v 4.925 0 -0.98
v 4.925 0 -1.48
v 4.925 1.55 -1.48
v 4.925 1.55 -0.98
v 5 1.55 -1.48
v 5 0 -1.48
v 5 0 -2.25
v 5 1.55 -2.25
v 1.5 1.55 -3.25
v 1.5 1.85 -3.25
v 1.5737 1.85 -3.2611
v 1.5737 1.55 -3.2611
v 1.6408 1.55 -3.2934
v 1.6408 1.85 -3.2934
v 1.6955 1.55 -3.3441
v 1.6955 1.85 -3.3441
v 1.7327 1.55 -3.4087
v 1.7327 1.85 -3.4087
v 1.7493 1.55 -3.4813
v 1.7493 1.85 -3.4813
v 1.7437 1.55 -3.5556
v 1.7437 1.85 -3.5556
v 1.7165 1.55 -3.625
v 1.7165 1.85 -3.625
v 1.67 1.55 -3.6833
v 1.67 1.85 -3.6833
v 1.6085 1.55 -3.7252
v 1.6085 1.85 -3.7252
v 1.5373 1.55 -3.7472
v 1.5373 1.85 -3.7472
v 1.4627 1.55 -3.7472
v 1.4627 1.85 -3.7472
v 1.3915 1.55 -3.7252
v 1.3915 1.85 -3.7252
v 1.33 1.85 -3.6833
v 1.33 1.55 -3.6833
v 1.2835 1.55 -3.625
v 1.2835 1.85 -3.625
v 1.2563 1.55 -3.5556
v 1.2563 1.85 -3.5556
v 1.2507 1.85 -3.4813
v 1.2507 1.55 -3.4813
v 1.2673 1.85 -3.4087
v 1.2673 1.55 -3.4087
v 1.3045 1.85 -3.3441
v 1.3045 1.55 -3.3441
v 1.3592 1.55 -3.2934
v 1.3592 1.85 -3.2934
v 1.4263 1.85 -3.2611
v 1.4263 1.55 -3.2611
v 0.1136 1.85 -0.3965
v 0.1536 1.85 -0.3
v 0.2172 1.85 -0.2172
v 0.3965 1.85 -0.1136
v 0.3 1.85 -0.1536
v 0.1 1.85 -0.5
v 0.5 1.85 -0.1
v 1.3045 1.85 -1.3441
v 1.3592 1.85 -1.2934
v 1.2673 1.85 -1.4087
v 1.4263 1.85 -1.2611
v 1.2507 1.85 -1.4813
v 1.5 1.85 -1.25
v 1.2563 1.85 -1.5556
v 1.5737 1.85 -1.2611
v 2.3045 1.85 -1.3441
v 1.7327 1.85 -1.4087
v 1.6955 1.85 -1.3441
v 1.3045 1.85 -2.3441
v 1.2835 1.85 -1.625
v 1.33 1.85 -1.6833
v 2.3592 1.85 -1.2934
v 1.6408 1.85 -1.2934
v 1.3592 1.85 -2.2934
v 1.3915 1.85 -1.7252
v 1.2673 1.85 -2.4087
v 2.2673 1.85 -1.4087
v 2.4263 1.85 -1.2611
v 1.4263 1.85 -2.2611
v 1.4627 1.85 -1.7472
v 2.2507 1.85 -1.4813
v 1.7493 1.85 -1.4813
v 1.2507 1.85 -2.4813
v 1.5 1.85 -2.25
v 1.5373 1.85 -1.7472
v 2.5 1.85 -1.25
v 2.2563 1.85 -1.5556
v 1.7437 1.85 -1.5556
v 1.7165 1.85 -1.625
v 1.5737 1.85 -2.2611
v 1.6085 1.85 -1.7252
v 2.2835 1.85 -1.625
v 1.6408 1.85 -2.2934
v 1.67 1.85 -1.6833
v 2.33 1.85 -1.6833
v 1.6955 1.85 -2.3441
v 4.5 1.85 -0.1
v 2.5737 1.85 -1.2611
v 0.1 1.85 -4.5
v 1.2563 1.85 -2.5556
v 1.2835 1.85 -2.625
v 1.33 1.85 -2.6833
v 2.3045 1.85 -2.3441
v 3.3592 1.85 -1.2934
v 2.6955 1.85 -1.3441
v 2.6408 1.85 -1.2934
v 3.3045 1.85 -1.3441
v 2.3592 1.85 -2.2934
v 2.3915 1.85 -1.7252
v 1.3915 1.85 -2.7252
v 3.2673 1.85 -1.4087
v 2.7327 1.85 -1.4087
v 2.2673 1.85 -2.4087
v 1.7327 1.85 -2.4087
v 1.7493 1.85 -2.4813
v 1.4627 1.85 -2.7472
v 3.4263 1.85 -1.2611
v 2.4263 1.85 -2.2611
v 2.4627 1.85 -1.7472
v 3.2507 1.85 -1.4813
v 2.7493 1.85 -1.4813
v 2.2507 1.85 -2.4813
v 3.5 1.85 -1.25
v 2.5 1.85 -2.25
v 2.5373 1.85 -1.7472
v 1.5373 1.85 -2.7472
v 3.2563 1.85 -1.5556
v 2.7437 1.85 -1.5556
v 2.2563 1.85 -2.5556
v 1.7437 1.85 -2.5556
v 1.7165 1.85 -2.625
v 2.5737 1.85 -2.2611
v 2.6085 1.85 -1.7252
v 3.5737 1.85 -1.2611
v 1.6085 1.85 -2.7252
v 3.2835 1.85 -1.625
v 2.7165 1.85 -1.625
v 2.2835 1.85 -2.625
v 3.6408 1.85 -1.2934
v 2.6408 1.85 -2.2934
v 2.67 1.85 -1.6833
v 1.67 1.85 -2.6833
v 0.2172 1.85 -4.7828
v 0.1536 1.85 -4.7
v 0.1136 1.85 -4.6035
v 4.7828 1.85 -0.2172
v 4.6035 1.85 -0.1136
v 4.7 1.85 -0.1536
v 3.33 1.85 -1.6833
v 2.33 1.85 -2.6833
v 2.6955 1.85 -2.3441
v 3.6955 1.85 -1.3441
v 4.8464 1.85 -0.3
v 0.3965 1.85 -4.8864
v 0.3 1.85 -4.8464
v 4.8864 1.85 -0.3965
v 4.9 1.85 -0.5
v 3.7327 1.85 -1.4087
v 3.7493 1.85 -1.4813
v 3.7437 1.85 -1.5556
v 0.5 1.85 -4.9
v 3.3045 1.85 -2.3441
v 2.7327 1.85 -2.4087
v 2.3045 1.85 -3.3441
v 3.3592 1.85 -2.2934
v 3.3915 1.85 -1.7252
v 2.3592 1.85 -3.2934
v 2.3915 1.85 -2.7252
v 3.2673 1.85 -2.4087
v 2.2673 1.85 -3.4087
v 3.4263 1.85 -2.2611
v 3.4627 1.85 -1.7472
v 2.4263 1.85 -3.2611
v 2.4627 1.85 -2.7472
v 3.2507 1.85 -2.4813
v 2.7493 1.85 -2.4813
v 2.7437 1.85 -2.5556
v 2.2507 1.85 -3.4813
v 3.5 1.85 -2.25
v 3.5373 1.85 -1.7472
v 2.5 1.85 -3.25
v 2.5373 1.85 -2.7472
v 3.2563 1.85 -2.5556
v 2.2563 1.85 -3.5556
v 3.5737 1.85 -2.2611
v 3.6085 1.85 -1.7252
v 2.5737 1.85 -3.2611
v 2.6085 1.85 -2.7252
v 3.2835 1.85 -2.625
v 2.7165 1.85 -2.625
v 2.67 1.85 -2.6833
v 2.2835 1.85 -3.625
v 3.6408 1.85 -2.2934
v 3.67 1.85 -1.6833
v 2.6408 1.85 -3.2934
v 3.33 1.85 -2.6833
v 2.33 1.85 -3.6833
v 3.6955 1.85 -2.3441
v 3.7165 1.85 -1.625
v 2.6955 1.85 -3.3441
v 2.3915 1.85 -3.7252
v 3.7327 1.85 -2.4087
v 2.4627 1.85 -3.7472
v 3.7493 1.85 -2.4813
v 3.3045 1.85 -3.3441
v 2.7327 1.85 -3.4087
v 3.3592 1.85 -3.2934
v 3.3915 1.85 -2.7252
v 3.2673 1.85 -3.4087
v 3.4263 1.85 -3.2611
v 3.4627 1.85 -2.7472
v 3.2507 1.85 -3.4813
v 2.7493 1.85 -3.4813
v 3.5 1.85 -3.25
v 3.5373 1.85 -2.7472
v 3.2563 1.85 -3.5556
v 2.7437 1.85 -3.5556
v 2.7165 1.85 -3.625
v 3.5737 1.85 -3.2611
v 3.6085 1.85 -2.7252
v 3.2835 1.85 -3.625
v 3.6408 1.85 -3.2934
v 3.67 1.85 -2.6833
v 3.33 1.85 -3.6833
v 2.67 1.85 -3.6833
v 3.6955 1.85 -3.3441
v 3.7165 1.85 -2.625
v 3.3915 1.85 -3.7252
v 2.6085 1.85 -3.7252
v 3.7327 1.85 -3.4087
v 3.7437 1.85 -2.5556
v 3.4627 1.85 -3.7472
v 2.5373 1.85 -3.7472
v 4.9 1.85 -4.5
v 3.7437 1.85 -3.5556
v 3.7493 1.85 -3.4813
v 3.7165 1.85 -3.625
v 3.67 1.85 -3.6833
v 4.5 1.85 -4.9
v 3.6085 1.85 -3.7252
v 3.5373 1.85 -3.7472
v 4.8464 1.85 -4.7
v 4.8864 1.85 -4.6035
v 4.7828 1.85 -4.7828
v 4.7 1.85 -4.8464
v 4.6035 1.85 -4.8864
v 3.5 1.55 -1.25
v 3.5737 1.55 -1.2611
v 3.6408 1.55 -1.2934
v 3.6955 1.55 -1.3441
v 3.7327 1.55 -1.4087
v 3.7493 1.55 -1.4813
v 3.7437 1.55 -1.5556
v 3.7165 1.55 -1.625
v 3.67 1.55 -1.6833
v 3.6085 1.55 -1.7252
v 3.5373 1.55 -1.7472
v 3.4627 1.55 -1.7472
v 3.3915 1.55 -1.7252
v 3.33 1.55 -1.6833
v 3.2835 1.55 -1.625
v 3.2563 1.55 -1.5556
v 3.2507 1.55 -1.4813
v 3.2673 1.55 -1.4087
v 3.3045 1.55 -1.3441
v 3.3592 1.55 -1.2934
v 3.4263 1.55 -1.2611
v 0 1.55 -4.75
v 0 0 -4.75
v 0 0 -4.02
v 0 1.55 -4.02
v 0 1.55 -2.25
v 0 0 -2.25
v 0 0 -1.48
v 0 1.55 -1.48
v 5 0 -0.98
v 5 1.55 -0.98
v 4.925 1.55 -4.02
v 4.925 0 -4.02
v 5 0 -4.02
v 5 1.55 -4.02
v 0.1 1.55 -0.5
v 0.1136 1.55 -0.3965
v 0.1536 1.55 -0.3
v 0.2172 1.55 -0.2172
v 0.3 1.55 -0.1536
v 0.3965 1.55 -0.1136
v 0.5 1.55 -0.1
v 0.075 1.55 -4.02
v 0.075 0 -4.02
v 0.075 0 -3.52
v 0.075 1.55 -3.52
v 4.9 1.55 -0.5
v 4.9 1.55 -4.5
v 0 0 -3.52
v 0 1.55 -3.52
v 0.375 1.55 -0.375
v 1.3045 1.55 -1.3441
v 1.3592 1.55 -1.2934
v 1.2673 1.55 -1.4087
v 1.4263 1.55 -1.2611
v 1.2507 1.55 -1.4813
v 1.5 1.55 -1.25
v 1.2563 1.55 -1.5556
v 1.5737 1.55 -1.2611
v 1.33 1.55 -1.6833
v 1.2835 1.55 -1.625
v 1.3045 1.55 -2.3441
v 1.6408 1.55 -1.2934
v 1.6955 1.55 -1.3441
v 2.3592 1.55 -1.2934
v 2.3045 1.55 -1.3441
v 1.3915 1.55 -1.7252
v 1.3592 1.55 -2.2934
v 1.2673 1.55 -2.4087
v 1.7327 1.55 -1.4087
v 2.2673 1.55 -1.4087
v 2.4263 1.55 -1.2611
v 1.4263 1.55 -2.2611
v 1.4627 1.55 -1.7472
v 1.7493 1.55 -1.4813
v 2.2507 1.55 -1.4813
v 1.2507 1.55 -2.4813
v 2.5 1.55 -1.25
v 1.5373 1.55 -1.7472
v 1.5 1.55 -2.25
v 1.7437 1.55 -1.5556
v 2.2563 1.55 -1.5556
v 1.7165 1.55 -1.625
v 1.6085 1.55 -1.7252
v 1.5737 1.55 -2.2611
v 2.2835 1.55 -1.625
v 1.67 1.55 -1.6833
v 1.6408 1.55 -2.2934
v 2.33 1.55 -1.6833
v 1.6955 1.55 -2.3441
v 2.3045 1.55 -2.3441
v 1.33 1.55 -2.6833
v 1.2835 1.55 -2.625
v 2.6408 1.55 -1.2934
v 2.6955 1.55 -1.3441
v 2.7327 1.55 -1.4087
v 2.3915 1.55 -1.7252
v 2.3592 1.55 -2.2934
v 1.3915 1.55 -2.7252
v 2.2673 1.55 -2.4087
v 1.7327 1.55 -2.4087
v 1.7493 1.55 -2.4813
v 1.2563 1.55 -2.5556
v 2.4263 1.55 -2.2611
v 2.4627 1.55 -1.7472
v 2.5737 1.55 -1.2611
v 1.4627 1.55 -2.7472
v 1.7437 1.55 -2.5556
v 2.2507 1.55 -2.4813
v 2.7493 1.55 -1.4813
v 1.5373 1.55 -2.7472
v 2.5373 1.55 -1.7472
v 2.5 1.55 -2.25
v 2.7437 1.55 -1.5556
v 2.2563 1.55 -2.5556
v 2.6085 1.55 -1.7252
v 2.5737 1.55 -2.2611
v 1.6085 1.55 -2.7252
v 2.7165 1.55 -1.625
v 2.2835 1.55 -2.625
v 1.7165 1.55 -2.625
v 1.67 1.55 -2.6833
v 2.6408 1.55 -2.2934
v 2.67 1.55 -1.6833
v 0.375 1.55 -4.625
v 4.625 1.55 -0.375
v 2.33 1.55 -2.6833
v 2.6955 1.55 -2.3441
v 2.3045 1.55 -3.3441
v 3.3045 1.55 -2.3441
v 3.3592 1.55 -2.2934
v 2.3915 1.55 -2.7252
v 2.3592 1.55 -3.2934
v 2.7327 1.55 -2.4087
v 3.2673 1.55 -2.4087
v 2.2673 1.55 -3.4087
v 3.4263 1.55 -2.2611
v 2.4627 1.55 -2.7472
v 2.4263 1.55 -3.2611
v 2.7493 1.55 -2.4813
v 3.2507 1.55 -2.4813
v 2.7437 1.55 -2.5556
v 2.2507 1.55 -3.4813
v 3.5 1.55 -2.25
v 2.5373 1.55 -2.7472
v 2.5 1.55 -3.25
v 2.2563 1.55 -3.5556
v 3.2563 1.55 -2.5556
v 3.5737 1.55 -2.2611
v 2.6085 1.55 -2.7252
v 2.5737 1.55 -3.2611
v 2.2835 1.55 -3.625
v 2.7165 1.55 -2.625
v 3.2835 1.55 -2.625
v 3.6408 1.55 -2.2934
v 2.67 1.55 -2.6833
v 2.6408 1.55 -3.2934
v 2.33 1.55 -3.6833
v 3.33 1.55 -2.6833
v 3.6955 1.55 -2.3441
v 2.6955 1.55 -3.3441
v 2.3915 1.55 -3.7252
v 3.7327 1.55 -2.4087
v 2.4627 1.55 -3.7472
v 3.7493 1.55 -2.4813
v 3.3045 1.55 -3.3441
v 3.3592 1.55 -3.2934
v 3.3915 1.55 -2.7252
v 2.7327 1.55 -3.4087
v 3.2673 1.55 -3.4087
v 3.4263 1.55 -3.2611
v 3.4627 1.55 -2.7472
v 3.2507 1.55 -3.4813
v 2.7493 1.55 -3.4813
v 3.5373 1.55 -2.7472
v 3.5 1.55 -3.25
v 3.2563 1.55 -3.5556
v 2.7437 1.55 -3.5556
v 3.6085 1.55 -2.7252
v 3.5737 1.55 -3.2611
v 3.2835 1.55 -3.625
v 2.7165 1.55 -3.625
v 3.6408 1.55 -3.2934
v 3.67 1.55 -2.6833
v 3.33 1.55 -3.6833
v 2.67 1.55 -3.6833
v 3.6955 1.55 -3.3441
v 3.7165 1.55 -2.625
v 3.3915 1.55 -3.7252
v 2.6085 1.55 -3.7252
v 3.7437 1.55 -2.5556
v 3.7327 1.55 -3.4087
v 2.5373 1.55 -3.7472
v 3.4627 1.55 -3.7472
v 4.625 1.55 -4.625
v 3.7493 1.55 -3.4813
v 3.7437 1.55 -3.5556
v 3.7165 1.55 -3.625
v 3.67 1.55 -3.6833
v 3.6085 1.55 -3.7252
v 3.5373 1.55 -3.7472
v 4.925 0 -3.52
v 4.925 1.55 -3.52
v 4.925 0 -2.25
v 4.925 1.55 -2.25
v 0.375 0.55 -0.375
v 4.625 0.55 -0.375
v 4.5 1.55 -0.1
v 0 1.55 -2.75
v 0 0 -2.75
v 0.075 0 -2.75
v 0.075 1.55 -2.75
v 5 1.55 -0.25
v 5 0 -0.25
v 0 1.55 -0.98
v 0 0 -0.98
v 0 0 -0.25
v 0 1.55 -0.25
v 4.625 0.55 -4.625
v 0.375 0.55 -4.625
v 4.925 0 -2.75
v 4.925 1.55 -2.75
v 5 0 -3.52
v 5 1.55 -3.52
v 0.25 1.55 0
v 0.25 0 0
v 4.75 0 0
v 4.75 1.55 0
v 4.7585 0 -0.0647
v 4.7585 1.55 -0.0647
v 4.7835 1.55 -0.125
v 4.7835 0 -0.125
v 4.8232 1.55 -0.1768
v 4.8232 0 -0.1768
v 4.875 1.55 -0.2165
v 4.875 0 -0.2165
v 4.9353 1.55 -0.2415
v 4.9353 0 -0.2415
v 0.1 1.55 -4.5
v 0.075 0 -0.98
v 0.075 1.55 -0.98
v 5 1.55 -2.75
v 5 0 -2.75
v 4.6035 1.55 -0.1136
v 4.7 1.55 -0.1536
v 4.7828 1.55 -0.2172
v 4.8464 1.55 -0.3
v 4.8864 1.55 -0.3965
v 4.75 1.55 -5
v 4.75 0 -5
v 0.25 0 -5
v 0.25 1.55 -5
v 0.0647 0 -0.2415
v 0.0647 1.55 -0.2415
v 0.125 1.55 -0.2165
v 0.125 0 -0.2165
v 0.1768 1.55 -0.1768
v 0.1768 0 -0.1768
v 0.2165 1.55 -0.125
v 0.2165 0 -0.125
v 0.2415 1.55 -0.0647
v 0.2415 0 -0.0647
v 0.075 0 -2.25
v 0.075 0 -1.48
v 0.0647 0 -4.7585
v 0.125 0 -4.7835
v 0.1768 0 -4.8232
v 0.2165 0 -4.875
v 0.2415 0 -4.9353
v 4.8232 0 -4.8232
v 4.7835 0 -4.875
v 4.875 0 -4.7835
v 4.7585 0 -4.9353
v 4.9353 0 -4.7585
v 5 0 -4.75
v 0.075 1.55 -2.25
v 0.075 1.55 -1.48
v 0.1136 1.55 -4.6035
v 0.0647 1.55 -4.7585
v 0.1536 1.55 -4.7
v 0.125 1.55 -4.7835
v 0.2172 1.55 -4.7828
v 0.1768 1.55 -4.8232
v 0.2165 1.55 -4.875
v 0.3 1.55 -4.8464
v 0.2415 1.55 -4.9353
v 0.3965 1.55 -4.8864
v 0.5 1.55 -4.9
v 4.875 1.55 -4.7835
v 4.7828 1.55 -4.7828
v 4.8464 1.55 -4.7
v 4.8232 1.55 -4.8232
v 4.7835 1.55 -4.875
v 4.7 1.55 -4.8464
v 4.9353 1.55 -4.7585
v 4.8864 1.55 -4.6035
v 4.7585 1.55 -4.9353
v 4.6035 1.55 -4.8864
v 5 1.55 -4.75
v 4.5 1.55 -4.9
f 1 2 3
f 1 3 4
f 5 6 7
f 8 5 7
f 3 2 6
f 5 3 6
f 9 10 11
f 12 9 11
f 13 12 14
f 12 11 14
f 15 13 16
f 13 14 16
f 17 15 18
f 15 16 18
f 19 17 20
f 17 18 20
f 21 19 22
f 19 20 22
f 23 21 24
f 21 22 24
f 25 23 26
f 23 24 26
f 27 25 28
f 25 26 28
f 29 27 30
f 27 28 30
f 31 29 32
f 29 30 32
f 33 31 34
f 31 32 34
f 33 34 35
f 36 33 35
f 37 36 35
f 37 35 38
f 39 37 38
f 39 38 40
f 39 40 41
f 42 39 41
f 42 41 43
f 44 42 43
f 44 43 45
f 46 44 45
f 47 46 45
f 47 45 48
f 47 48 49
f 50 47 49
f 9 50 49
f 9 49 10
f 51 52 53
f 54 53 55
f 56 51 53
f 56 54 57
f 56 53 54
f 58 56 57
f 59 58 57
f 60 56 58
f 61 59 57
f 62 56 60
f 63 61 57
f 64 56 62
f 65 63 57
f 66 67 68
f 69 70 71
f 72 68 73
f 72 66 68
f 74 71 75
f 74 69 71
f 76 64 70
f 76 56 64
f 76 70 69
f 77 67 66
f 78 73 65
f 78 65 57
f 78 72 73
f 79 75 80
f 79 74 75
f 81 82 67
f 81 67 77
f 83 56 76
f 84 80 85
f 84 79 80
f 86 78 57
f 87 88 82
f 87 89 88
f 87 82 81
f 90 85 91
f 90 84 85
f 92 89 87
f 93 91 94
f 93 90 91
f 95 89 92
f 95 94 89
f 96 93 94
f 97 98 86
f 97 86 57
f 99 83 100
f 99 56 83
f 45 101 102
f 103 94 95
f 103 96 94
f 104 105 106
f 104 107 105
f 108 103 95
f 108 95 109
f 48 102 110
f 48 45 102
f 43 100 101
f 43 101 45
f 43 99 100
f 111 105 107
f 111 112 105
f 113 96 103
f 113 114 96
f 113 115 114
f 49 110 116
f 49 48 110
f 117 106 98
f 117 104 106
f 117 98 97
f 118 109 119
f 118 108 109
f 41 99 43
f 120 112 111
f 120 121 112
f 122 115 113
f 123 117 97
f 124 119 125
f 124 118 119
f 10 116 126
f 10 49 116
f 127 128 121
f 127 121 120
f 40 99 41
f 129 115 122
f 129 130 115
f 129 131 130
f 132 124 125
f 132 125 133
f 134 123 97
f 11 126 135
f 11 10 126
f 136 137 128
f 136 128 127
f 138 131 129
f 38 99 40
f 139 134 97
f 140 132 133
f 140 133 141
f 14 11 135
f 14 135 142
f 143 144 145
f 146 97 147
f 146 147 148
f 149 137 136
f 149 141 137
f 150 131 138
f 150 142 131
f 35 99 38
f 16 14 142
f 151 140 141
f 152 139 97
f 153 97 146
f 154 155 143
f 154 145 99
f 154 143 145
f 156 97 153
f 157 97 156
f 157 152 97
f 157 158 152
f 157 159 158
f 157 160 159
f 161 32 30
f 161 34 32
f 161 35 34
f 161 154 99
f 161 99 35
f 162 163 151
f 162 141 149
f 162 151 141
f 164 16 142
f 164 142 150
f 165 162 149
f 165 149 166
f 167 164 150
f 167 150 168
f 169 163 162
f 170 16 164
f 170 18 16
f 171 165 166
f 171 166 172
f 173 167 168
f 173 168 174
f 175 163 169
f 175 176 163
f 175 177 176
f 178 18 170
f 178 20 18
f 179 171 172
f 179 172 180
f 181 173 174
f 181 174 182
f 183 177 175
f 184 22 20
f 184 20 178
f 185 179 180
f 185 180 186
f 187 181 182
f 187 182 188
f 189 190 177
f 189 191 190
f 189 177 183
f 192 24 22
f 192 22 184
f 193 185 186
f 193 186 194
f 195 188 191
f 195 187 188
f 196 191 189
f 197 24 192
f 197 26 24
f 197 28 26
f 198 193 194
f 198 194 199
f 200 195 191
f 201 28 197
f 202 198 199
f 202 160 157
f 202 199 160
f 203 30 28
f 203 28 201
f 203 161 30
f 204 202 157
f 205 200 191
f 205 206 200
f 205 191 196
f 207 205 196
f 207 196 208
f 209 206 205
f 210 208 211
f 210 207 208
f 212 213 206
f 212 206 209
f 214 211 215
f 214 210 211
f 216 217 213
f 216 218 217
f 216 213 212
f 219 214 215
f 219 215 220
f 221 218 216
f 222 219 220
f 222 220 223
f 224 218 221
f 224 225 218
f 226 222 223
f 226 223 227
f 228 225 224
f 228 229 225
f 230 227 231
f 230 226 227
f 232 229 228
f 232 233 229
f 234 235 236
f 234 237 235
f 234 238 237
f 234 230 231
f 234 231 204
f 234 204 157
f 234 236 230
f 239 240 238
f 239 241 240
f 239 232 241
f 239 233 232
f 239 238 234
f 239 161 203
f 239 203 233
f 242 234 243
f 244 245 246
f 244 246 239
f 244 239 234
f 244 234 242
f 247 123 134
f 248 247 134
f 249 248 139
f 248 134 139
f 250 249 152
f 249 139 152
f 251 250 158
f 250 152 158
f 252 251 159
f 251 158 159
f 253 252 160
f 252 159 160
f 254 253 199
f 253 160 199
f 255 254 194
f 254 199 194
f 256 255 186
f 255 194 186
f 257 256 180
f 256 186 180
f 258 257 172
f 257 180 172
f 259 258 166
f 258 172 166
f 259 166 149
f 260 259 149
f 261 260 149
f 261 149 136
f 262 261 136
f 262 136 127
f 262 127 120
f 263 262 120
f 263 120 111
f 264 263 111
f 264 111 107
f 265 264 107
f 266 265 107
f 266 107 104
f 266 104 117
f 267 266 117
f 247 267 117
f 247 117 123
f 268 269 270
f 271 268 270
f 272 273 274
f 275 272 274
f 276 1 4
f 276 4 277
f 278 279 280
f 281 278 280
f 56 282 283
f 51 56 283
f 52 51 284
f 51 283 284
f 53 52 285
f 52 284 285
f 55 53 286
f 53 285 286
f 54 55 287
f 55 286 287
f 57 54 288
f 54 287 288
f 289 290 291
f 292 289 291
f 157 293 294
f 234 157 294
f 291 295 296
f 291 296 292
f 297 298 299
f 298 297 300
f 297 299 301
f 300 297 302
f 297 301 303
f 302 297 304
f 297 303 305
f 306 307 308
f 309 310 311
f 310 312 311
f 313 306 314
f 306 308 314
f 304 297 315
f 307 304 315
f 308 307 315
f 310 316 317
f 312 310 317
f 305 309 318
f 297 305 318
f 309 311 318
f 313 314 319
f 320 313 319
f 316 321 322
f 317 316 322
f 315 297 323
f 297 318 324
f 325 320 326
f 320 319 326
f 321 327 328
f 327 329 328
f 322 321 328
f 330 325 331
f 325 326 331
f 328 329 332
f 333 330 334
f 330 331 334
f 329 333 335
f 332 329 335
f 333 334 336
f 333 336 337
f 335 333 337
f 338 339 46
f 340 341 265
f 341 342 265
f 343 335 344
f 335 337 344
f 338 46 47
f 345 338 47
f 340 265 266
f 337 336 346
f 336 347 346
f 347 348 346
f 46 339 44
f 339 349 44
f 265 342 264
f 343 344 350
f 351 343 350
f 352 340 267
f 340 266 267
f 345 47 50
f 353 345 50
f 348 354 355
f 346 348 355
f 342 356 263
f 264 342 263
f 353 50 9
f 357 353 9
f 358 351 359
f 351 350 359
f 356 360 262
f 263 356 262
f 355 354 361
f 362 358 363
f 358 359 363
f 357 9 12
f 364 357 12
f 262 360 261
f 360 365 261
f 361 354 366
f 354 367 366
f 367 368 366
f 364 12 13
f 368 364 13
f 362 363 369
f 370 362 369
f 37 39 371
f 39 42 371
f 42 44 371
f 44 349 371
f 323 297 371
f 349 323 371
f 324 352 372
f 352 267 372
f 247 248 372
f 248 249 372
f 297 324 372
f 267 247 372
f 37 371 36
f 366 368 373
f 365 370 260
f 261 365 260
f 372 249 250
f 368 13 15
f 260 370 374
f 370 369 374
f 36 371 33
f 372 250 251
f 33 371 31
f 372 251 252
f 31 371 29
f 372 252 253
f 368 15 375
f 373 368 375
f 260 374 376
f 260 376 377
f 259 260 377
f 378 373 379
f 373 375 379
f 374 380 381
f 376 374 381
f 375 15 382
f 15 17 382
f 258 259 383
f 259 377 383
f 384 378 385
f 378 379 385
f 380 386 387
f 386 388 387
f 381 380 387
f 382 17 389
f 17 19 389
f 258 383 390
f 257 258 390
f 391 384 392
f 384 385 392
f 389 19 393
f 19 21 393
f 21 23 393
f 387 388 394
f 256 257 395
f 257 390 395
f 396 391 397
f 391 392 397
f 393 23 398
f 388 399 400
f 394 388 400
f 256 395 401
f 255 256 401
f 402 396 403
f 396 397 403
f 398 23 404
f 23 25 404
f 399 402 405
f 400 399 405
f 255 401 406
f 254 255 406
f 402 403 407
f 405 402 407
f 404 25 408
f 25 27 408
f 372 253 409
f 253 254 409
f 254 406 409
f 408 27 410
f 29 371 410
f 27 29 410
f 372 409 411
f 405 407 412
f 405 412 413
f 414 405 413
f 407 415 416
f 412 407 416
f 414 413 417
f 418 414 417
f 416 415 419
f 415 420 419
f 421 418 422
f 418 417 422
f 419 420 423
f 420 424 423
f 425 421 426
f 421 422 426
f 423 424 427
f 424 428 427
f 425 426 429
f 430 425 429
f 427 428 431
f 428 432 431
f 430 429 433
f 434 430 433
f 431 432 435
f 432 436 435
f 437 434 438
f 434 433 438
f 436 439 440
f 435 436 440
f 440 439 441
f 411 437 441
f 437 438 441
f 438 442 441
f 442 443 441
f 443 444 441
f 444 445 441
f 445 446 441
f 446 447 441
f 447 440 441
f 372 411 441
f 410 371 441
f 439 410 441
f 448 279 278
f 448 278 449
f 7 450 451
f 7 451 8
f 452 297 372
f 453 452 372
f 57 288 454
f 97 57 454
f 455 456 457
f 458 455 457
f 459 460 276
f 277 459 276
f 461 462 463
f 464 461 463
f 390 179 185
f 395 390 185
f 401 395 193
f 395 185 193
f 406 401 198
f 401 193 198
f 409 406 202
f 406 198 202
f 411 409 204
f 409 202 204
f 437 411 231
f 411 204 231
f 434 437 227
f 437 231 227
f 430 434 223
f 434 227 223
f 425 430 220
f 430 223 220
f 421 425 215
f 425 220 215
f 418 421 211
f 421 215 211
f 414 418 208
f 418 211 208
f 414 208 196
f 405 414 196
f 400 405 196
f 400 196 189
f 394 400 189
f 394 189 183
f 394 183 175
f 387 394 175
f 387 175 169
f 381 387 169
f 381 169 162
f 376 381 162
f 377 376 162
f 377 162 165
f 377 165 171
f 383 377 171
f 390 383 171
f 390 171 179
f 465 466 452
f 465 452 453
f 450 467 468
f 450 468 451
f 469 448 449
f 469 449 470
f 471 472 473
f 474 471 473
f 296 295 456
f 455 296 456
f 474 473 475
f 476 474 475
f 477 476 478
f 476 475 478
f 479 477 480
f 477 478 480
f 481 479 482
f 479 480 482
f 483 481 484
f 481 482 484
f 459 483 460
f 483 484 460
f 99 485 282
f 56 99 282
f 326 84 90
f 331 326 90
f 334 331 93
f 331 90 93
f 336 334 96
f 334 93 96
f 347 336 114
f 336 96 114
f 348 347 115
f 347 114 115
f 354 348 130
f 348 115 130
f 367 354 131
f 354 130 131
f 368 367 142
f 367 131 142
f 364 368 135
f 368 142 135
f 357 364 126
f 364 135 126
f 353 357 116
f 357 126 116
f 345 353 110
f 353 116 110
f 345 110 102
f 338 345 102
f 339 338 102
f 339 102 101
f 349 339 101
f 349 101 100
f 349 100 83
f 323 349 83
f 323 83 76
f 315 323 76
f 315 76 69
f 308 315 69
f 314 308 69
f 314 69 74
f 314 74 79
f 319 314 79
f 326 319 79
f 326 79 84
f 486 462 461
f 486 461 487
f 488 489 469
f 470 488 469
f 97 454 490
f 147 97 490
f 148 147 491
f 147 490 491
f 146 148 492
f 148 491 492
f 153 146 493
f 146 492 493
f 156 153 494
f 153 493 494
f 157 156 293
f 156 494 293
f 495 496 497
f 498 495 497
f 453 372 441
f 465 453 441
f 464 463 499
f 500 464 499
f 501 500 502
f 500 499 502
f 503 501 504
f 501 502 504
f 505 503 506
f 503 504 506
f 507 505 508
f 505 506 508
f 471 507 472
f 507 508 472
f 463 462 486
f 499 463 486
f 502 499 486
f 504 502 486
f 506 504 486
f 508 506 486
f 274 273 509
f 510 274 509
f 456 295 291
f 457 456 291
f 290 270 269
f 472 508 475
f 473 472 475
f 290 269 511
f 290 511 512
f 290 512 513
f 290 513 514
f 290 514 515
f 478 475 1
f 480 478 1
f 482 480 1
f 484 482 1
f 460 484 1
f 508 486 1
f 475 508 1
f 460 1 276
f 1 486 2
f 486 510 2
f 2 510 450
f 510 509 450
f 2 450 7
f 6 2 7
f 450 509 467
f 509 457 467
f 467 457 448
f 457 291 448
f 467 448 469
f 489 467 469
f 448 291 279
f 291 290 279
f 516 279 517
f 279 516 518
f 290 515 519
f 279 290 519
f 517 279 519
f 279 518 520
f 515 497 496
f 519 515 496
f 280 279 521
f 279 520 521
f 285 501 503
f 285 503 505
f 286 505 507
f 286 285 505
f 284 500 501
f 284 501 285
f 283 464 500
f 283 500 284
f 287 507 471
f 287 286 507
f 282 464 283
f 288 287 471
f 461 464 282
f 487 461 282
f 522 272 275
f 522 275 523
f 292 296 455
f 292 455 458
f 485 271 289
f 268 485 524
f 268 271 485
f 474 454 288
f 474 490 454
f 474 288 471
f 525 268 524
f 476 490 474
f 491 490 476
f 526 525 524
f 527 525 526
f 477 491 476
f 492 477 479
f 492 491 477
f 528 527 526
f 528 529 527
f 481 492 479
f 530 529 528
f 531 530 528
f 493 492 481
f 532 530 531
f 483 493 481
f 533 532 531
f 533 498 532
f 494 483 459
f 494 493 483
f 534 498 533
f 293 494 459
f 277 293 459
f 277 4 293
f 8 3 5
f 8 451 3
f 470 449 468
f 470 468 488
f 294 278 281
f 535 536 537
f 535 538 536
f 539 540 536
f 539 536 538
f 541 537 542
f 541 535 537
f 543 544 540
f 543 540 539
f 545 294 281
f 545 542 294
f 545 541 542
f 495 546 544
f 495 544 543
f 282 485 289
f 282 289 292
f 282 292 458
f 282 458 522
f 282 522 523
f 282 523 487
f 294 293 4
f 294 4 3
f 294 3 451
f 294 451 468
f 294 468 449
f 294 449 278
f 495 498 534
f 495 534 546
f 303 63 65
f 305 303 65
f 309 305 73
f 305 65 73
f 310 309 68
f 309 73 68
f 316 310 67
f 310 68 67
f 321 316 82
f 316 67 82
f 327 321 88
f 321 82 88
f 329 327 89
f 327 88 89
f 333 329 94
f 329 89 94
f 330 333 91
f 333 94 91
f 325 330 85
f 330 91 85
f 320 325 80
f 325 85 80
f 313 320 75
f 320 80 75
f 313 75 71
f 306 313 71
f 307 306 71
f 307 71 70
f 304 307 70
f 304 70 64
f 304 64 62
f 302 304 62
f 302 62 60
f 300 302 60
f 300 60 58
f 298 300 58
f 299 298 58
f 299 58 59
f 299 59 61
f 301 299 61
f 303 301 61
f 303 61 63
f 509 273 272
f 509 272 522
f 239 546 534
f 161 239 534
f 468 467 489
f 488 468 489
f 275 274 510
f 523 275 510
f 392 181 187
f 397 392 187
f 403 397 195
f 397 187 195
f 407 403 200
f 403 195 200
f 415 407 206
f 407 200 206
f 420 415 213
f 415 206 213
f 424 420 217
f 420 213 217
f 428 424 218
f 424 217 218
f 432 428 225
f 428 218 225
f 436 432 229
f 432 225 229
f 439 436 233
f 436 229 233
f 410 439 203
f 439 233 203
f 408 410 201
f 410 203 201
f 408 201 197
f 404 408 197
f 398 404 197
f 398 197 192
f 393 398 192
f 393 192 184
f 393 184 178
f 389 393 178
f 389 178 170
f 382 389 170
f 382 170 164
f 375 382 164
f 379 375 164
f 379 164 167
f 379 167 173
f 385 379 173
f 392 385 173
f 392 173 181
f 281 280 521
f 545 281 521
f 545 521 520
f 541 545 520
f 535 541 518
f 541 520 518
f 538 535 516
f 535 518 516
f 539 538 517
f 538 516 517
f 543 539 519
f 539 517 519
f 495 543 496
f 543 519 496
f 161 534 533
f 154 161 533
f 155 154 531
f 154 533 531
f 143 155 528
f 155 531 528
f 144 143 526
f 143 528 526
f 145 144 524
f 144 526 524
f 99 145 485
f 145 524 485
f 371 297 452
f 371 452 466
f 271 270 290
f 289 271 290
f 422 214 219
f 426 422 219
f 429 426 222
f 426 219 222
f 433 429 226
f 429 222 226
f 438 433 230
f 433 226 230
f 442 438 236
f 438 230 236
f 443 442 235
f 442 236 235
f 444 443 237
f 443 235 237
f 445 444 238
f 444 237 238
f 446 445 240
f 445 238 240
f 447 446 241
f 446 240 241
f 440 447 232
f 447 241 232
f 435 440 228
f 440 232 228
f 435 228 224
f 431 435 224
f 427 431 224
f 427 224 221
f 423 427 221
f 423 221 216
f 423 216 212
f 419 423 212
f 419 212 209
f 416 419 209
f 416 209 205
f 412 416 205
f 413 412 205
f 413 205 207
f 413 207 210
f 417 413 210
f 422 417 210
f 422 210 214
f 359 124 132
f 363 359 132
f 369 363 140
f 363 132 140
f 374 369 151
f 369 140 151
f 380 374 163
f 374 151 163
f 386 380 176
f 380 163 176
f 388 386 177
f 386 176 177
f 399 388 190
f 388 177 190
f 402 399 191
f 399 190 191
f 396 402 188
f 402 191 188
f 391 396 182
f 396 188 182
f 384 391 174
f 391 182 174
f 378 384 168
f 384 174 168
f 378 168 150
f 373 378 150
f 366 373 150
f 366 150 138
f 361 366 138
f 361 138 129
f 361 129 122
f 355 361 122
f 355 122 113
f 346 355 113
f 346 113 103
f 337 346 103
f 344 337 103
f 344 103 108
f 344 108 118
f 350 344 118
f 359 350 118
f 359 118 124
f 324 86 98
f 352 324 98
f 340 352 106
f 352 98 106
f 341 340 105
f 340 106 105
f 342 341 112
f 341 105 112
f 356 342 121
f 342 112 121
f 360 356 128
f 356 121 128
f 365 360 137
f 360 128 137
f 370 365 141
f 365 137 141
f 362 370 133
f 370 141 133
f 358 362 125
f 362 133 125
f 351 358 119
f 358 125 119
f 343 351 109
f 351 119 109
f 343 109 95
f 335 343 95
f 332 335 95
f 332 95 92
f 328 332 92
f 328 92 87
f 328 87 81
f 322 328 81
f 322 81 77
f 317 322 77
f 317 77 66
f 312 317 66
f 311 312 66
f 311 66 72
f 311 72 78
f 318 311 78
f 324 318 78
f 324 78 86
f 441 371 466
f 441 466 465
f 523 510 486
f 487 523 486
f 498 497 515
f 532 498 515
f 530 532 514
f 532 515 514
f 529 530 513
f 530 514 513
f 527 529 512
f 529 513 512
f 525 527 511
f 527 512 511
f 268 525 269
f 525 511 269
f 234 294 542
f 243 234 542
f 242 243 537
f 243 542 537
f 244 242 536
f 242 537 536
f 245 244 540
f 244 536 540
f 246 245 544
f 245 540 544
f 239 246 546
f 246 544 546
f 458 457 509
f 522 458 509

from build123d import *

# Parameters (mm, degrees)
BOSS_EXTRUDE1_DEPTH = 1.55
BOSS_EXTRUDE2_DEPTH = 0.3
SKETCH4_W           = 0.15
SKETCH4_H           = 0.5
CUT_EXTRUDE1_DEPTH  = 1.55
SKETCH5_W           = 4.25
SKETCH5_H           = 4.25
CUT_EXTRUDE2_DEPTH  = 1
CUT_EXTRUDE3_REACH  = 9.309
SKETCH6_R           = 0.25


with BuildPart() as part:
    # Sketch1 → Boss-Extrude1 (new body)
    with BuildSketch(Plane(origin=(0, 0, 0), x_dir=(1, 0, 0), z_dir=(0, 1, 0))):
        with BuildLine():
            ThreePointArc((0, 0.25), (0.176776695, 0.176776695), (0.25, 0))
            Line((0.25, 0), (4.75, 0))
            ThreePointArc((4.75, 0), (4.823223305, 0.176776695), (5, 0.25))
            Line((5, 0.25), (5, 4.75))
            ThreePointArc((5, 4.75), (4.823223305, 4.823223305), (4.75, 5))
            Line((4.75, 5), (0.25, 5))
            ThreePointArc((0.25, 5), (0.176776695, 4.823223305), (0, 4.75))
            Line((0, 4.75), (0, 0.25))
        make_face()
    extrude(amount=BOSS_EXTRUDE1_DEPTH)

    # Sketch2 → Boss-Extrude2 (add)
    with BuildSketch(Plane(origin=(0, 1.55, 0), x_dir=(1, 0, 0), z_dir=(0, 1, 0))):
        with BuildLine():
            Line((0.5, 0.1), (4.5, 0.1))
            ThreePointArc((4.5, 0.1), (4.782842712, 0.217157288), (4.9, 0.5))
            Line((4.9, 0.5), (4.9, 4.5))
            ThreePointArc((4.9, 4.5), (4.782842712, 4.782842712), (4.5, 4.9))
            Line((4.5, 4.9), (0.5, 4.9))
            ThreePointArc((0.5, 4.9), (0.217157288, 4.782842712), (0.1, 4.5))
            Line((0.1, 4.5), (0.1, 0.5))
            ThreePointArc((0.1, 0.5), (0.217157288, 0.217157288), (0.5, 0.1))
        make_face()
    extrude(amount=BOSS_EXTRUDE2_DEPTH)

    # Sketch4 → Cut-Extrude1 (cut)
    with BuildSketch(Plane.XZ):
        with Locations((0, -2.5)):
            Rectangle(SKETCH4_W, SKETCH4_H)
        with Locations((5, -1.23)):
            Rectangle(SKETCH4_W, SKETCH4_H)
        with Locations((0, -1.23)):
            Rectangle(SKETCH4_W, SKETCH4_H)
        with Locations((0, -3.77)):
            Rectangle(SKETCH4_W, SKETCH4_H)
        with Locations((5, -2.5)):
            Rectangle(SKETCH4_W, SKETCH4_H)
        with Locations((5, -3.77)):
            Rectangle(SKETCH4_W, SKETCH4_H)
    extrude(amount=-CUT_EXTRUDE1_DEPTH, mode=Mode.SUBTRACT)

    # Sketch5 → Cut-Extrude2 (cut)
    with BuildSketch(Plane(origin=(0, 1.55, 0), x_dir=(1, 0, 0), z_dir=(0, 1, 0))):
        with Locations((2.5, 2.5)):
            Rectangle(SKETCH5_W, SKETCH5_H)
    extrude(amount=-CUT_EXTRUDE2_DEPTH, mode=Mode.SUBTRACT)

    # Sketch6 → Cut-Extrude3 (cut, up to next)
    with BuildSketch(Plane(origin=(0, 1.85, 0), x_dir=(1, 0, 0), z_dir=(0, 1, 0)), mode=Mode.PRIVATE) as cut_extrude3_sk1:
        with Locations(Location((2.5, 2.5, 0), (0, 0, 270))):
            Circle(SKETCH6_R)
    cut_extrude3_tool1 = extrude(cut_extrude3_sk1.sketch, amount=-CUT_EXTRUDE3_REACH, mode=Mode.PRIVATE) & part.part
    # Sketch6 → Cut-Extrude3 (cut, up to next)
    with BuildSketch(Plane(origin=(0, 1.85, 0), x_dir=(1, 0, 0), z_dir=(0, 1, 0)), mode=Mode.PRIVATE) as cut_extrude3_sk2:
        with Locations(Location((2.5, 1.5, 0), (0, 0, 270))):
            Circle(SKETCH6_R)
    cut_extrude3_tool2 = extrude(cut_extrude3_sk2.sketch, amount=-CUT_EXTRUDE3_REACH, mode=Mode.PRIVATE) & part.part
    # Sketch6 → Cut-Extrude3 (cut, up to next)
    with BuildSketch(Plane(origin=(0, 1.85, 0), x_dir=(1, 0, 0), z_dir=(0, 1, 0)), mode=Mode.PRIVATE) as cut_extrude3_sk3:
        with Locations(Location((2.5, 3.5, 0), (0, 0, 270))):
            Circle(SKETCH6_R)
    cut_extrude3_tool3 = extrude(cut_extrude3_sk3.sketch, amount=-CUT_EXTRUDE3_REACH, mode=Mode.PRIVATE) & part.part
    # Sketch6 → Cut-Extrude3 (cut, up to next)
    with BuildSketch(Plane(origin=(0, 1.85, 0), x_dir=(1, 0, 0), z_dir=(0, 1, 0)), mode=Mode.PRIVATE) as cut_extrude3_sk4:
        with Locations(Location((3.5, 1.5, 0), (0, 0, 270))):
            Circle(SKETCH6_R)
    cut_extrude3_tool4 = extrude(cut_extrude3_sk4.sketch, amount=-CUT_EXTRUDE3_REACH, mode=Mode.PRIVATE) & part.part
    # Sketch6 → Cut-Extrude3 (cut, up to next)
    with BuildSketch(Plane(origin=(0, 1.85, 0), x_dir=(1, 0, 0), z_dir=(0, 1, 0)), mode=Mode.PRIVATE) as cut_extrude3_sk5:
        with Locations(Location((3.5, 2.5, 0), (0, 0, 270))):
            Circle(SKETCH6_R)
    cut_extrude3_tool5 = extrude(cut_extrude3_sk5.sketch, amount=-CUT_EXTRUDE3_REACH, mode=Mode.PRIVATE) & part.part
    # Sketch6 → Cut-Extrude3 (cut, up to next)
    with BuildSketch(Plane(origin=(0, 1.85, 0), x_dir=(1, 0, 0), z_dir=(0, 1, 0)), mode=Mode.PRIVATE) as cut_extrude3_sk6:
        with Locations(Location((3.5, 3.5, 0), (0, 0, 270))):
            Circle(SKETCH6_R)
    cut_extrude3_tool6 = extrude(cut_extrude3_sk6.sketch, amount=-CUT_EXTRUDE3_REACH, mode=Mode.PRIVATE) & part.part
    # Sketch6 → Cut-Extrude3 (cut, up to next)
    with BuildSketch(Plane(origin=(0, 1.85, 0), x_dir=(1, 0, 0), z_dir=(0, 1, 0)), mode=Mode.PRIVATE) as cut_extrude3_sk7:
        with Locations(Location((1.5, 2.5, 0), (0, 0, 270))):
            Circle(SKETCH6_R)
    cut_extrude3_tool7 = extrude(cut_extrude3_sk7.sketch, amount=-CUT_EXTRUDE3_REACH, mode=Mode.PRIVATE) & part.part
    # Sketch6 → Cut-Extrude3 (cut, up to next)
    with BuildSketch(Plane(origin=(0, 1.85, 0), x_dir=(1, 0, 0), z_dir=(0, 1, 0)), mode=Mode.PRIVATE) as cut_extrude3_sk8:
        with Locations(Location((1.5, 3.5, 0), (0, 0, 270))):
            Circle(SKETCH6_R)
    cut_extrude3_tool8 = extrude(cut_extrude3_sk8.sketch, amount=-CUT_EXTRUDE3_REACH, mode=Mode.PRIVATE) & part.part
    # Sketch6 → Cut-Extrude3 (cut, up to next)
    with BuildSketch(Plane(origin=(0, 1.85, 0), x_dir=(1, 0, 0), z_dir=(0, 1, 0)), mode=Mode.PRIVATE) as cut_extrude3_sk9:
        with Locations(Location((1.5, 1.5, 0), (0, 0, 270))):
            Circle(SKETCH6_R)
    cut_extrude3_tool9 = extrude(cut_extrude3_sk9.sketch, amount=-CUT_EXTRUDE3_REACH, mode=Mode.PRIVATE) & part.part
    add(cut_extrude3_tool1.solids().sort_by_distance((2.5, 1.85, -2.5))[0], mode=Mode.SUBTRACT)
    add(cut_extrude3_tool2.solids().sort_by_distance((2.5, 1.85, -1.5))[0], mode=Mode.SUBTRACT)
    add(cut_extrude3_tool3.solids().sort_by_distance((2.5, 1.85, -3.5))[0], mode=Mode.SUBTRACT)
    add(cut_extrude3_tool4.solids().sort_by_distance((3.5, 1.85, -1.5))[0], mode=Mode.SUBTRACT)
    add(cut_extrude3_tool5.solids().sort_by_distance((3.5, 1.85, -2.5))[0], mode=Mode.SUBTRACT)
    add(cut_extrude3_tool6.solids().sort_by_distance((3.5, 1.85, -3.5))[0], mode=Mode.SUBTRACT)
    add(cut_extrude3_tool7.solids().sort_by_distance((1.5, 1.85, -2.5))[0], mode=Mode.SUBTRACT)
    add(cut_extrude3_tool8.solids().sort_by_distance((1.5, 1.85, -3.5))[0], mode=Mode.SUBTRACT)
    add(cut_extrude3_tool9.solids().sort_by_distance((1.5, 1.85, -1.5))[0], mode=Mode.SUBTRACT)


solid = part.part
